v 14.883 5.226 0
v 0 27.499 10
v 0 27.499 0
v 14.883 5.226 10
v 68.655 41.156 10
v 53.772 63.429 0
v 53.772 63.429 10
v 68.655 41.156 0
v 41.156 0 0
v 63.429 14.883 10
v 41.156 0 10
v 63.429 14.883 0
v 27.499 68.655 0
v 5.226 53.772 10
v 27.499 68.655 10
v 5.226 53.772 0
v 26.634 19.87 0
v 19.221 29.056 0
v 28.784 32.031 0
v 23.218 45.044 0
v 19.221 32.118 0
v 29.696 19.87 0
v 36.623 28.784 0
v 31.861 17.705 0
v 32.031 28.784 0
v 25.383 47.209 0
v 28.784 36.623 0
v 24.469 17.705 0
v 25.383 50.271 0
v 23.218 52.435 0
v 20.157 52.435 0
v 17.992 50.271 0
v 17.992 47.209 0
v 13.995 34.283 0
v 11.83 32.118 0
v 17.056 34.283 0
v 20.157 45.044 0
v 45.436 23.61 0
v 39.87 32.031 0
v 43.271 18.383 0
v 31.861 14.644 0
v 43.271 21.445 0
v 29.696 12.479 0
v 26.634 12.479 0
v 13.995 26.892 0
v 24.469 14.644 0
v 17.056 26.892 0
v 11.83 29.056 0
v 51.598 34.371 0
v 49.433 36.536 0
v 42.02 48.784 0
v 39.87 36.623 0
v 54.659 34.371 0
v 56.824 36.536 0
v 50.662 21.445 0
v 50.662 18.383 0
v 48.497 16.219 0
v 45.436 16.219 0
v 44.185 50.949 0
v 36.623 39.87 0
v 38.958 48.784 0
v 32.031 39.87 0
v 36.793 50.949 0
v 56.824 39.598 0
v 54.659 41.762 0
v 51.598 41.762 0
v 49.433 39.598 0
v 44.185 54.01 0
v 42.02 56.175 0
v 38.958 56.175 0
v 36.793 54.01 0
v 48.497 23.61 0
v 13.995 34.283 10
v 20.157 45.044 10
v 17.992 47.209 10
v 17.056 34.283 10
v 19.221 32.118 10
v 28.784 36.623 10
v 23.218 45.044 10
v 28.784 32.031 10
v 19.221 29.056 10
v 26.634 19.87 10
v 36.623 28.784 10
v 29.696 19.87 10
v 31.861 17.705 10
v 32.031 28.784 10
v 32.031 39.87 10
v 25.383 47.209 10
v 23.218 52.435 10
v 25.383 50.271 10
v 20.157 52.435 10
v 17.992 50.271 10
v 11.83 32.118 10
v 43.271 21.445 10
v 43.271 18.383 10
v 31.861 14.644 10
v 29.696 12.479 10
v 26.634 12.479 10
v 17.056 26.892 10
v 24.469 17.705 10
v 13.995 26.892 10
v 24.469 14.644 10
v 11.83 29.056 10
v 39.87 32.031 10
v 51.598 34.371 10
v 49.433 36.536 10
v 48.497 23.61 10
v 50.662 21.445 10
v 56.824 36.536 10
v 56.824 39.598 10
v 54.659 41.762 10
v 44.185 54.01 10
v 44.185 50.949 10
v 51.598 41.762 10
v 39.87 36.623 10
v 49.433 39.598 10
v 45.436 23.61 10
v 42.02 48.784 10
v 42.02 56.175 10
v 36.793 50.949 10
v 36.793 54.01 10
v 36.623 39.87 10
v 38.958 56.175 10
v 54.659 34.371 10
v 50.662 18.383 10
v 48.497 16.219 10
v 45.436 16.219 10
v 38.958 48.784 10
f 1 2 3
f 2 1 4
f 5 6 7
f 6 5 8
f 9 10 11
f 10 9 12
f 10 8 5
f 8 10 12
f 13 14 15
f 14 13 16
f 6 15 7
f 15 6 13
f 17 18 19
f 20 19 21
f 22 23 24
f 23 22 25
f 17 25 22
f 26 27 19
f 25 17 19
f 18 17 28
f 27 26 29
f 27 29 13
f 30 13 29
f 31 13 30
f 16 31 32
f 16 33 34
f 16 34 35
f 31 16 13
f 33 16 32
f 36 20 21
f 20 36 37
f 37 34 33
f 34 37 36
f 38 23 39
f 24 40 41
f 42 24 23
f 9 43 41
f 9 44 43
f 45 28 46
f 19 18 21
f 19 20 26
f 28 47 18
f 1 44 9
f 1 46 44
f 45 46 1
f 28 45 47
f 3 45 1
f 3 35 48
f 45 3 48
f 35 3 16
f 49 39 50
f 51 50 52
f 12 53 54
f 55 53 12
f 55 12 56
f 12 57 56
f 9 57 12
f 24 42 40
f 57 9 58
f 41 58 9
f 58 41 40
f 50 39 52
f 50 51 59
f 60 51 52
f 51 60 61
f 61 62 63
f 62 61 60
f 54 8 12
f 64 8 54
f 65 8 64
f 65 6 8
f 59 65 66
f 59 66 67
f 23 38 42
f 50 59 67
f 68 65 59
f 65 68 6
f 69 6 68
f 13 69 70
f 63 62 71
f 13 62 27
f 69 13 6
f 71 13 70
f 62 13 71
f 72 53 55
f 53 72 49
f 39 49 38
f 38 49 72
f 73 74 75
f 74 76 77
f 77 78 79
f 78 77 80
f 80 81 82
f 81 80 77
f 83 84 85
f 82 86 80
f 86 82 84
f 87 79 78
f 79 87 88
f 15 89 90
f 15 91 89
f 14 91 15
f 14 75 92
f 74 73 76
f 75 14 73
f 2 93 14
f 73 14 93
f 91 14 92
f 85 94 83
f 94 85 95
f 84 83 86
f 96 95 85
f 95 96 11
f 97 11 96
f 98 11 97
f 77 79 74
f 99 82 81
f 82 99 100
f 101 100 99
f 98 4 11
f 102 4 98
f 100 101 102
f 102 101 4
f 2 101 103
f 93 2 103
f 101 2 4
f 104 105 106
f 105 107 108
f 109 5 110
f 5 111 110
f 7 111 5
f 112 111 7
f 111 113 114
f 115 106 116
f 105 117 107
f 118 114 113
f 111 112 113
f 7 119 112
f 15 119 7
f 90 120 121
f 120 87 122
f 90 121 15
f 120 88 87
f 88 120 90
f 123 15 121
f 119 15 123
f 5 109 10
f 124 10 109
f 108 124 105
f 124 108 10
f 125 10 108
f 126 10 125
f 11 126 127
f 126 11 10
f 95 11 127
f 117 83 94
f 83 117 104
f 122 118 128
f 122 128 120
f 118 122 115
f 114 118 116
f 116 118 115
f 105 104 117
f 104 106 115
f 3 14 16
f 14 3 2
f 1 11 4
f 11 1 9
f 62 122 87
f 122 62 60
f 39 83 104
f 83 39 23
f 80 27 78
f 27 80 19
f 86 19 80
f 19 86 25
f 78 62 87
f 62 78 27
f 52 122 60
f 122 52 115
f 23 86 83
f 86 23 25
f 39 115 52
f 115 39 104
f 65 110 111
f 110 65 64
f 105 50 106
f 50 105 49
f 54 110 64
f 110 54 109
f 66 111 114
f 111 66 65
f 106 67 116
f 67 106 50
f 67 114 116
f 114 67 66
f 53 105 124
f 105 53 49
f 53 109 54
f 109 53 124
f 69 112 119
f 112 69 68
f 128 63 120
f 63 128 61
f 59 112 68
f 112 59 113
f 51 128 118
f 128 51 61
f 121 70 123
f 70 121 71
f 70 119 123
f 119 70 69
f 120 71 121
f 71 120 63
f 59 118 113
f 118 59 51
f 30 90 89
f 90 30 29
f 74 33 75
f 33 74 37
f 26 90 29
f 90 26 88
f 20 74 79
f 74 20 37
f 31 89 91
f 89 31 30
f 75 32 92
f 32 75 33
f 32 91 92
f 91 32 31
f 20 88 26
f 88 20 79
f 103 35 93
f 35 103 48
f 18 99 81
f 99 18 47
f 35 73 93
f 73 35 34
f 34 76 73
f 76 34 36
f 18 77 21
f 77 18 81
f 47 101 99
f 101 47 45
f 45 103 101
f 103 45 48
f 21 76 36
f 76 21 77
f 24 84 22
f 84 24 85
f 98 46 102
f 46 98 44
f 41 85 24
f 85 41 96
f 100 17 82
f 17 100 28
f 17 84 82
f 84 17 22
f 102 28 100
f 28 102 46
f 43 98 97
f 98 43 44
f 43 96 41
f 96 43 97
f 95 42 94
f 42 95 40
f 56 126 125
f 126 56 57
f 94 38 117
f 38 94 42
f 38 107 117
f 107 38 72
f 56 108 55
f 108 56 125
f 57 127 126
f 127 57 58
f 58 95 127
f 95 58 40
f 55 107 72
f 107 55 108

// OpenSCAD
$fn = 32;

// ----------------------------------------------------------------------
// Polygon plate: 8-gon R35, 6 bolt windows
// ----------------------------------------------------------------------

// --- parameters (mm) ---
sides = 8;                // number of polygon sides
plate_r = 35;             // circumscribed radius of the polygon
bore_r = 6;               // centre bore radius
bolts = 6;                // number of bolt windows
ring_r = 19.17;           // bolt-circle radius
bolt_r = 4;               // bolt window radius
plate_t = 10;             // plate thickness, Z (extrusion height)

plate_d = 2 * plate_r;  // circumscribed diameter
bore_d = 2 * bore_r;  // centre bore diameter
bolt_d = 2 * bolt_r;  // bolt window diameter
ring_d = 2 * ring_r;  // bolt-circle diameter

profile = [[68.655, 41.156], [53.772, 63.429], [27.499, 68.655], [5.226, 53.772], [0, 27.499], [14.883, 5.226], [41.156, 0], [63.429, 14.883]];  // primary outline, 8 points, counter clockwise
void_1 = [[39.87, 36.623], [36.623, 39.87], [32.031, 39.87], [28.784, 36.623], [28.784, 32.031], [32.031, 28.784], [36.623, 28.784], [39.87, 32.031]];  // centre bore, 8 points
void_2 = [[56.824, 39.598], [54.659, 41.762], [51.598, 41.762], [49.433, 39.598], [49.433, 36.536], [51.598, 34.371], [54.659, 34.371], [56.824, 36.536]];  // bolt window 1, 8 points
void_3 = [[44.185, 54.01], [42.02, 56.175], [38.958, 56.175], [36.793, 54.01], [36.793, 50.949], [38.958, 48.784], [42.02, 48.784], [44.185, 50.949]];  // bolt window 2, 8 points
void_4 = [[25.383, 50.271], [23.218, 52.435], [20.157, 52.435], [17.992, 50.271], [17.992, 47.209], [20.157, 45.044], [23.218, 45.044], [25.383, 47.209]];  // bolt window 3, 8 points
void_5 = [[19.221, 32.118], [17.056, 34.283], [13.995, 34.283], [11.83, 32.118], [11.83, 29.056], [13.995, 26.892], [17.056, 26.892], [19.221, 29.056]];  // bolt window 4, 8 points
void_6 = [[31.861, 17.705], [29.696, 19.87], [26.634, 19.87], [24.469, 17.705], [24.469, 14.644], [26.634, 12.479], [29.696, 12.479], [31.861, 14.644]];  // bolt window 5, 8 points
void_7 = [[50.662, 21.445], [48.497, 23.61], [45.436, 23.61], [43.271, 21.445], [43.271, 18.383], [45.436, 16.219], [48.497, 16.219], [50.662, 18.383]];  // bolt window 6, 8 points

// --- the one profile operation ---
difference() {
  linear_extrude(height = plate_t) polygon(points = profile);
  translate([0, 0, -1])
    linear_extrude(height = plate_t + 2) polygon(points = void_1);
  translate([0, 0, -1])
    linear_extrude(height = plate_t + 2) polygon(points = void_2);
  translate([0, 0, -1])
    linear_extrude(height = plate_t + 2) polygon(points = void_3);
  translate([0, 0, -1])
    linear_extrude(height = plate_t + 2) polygon(points = void_4);
  translate([0, 0, -1])
    linear_extrude(height = plate_t + 2) polygon(points = void_5);
  translate([0, 0, -1])
    linear_extrude(height = plate_t + 2) polygon(points = void_6);
  translate([0, 0, -1])
    linear_extrude(height = plate_t + 2) polygon(points = void_7);
}
